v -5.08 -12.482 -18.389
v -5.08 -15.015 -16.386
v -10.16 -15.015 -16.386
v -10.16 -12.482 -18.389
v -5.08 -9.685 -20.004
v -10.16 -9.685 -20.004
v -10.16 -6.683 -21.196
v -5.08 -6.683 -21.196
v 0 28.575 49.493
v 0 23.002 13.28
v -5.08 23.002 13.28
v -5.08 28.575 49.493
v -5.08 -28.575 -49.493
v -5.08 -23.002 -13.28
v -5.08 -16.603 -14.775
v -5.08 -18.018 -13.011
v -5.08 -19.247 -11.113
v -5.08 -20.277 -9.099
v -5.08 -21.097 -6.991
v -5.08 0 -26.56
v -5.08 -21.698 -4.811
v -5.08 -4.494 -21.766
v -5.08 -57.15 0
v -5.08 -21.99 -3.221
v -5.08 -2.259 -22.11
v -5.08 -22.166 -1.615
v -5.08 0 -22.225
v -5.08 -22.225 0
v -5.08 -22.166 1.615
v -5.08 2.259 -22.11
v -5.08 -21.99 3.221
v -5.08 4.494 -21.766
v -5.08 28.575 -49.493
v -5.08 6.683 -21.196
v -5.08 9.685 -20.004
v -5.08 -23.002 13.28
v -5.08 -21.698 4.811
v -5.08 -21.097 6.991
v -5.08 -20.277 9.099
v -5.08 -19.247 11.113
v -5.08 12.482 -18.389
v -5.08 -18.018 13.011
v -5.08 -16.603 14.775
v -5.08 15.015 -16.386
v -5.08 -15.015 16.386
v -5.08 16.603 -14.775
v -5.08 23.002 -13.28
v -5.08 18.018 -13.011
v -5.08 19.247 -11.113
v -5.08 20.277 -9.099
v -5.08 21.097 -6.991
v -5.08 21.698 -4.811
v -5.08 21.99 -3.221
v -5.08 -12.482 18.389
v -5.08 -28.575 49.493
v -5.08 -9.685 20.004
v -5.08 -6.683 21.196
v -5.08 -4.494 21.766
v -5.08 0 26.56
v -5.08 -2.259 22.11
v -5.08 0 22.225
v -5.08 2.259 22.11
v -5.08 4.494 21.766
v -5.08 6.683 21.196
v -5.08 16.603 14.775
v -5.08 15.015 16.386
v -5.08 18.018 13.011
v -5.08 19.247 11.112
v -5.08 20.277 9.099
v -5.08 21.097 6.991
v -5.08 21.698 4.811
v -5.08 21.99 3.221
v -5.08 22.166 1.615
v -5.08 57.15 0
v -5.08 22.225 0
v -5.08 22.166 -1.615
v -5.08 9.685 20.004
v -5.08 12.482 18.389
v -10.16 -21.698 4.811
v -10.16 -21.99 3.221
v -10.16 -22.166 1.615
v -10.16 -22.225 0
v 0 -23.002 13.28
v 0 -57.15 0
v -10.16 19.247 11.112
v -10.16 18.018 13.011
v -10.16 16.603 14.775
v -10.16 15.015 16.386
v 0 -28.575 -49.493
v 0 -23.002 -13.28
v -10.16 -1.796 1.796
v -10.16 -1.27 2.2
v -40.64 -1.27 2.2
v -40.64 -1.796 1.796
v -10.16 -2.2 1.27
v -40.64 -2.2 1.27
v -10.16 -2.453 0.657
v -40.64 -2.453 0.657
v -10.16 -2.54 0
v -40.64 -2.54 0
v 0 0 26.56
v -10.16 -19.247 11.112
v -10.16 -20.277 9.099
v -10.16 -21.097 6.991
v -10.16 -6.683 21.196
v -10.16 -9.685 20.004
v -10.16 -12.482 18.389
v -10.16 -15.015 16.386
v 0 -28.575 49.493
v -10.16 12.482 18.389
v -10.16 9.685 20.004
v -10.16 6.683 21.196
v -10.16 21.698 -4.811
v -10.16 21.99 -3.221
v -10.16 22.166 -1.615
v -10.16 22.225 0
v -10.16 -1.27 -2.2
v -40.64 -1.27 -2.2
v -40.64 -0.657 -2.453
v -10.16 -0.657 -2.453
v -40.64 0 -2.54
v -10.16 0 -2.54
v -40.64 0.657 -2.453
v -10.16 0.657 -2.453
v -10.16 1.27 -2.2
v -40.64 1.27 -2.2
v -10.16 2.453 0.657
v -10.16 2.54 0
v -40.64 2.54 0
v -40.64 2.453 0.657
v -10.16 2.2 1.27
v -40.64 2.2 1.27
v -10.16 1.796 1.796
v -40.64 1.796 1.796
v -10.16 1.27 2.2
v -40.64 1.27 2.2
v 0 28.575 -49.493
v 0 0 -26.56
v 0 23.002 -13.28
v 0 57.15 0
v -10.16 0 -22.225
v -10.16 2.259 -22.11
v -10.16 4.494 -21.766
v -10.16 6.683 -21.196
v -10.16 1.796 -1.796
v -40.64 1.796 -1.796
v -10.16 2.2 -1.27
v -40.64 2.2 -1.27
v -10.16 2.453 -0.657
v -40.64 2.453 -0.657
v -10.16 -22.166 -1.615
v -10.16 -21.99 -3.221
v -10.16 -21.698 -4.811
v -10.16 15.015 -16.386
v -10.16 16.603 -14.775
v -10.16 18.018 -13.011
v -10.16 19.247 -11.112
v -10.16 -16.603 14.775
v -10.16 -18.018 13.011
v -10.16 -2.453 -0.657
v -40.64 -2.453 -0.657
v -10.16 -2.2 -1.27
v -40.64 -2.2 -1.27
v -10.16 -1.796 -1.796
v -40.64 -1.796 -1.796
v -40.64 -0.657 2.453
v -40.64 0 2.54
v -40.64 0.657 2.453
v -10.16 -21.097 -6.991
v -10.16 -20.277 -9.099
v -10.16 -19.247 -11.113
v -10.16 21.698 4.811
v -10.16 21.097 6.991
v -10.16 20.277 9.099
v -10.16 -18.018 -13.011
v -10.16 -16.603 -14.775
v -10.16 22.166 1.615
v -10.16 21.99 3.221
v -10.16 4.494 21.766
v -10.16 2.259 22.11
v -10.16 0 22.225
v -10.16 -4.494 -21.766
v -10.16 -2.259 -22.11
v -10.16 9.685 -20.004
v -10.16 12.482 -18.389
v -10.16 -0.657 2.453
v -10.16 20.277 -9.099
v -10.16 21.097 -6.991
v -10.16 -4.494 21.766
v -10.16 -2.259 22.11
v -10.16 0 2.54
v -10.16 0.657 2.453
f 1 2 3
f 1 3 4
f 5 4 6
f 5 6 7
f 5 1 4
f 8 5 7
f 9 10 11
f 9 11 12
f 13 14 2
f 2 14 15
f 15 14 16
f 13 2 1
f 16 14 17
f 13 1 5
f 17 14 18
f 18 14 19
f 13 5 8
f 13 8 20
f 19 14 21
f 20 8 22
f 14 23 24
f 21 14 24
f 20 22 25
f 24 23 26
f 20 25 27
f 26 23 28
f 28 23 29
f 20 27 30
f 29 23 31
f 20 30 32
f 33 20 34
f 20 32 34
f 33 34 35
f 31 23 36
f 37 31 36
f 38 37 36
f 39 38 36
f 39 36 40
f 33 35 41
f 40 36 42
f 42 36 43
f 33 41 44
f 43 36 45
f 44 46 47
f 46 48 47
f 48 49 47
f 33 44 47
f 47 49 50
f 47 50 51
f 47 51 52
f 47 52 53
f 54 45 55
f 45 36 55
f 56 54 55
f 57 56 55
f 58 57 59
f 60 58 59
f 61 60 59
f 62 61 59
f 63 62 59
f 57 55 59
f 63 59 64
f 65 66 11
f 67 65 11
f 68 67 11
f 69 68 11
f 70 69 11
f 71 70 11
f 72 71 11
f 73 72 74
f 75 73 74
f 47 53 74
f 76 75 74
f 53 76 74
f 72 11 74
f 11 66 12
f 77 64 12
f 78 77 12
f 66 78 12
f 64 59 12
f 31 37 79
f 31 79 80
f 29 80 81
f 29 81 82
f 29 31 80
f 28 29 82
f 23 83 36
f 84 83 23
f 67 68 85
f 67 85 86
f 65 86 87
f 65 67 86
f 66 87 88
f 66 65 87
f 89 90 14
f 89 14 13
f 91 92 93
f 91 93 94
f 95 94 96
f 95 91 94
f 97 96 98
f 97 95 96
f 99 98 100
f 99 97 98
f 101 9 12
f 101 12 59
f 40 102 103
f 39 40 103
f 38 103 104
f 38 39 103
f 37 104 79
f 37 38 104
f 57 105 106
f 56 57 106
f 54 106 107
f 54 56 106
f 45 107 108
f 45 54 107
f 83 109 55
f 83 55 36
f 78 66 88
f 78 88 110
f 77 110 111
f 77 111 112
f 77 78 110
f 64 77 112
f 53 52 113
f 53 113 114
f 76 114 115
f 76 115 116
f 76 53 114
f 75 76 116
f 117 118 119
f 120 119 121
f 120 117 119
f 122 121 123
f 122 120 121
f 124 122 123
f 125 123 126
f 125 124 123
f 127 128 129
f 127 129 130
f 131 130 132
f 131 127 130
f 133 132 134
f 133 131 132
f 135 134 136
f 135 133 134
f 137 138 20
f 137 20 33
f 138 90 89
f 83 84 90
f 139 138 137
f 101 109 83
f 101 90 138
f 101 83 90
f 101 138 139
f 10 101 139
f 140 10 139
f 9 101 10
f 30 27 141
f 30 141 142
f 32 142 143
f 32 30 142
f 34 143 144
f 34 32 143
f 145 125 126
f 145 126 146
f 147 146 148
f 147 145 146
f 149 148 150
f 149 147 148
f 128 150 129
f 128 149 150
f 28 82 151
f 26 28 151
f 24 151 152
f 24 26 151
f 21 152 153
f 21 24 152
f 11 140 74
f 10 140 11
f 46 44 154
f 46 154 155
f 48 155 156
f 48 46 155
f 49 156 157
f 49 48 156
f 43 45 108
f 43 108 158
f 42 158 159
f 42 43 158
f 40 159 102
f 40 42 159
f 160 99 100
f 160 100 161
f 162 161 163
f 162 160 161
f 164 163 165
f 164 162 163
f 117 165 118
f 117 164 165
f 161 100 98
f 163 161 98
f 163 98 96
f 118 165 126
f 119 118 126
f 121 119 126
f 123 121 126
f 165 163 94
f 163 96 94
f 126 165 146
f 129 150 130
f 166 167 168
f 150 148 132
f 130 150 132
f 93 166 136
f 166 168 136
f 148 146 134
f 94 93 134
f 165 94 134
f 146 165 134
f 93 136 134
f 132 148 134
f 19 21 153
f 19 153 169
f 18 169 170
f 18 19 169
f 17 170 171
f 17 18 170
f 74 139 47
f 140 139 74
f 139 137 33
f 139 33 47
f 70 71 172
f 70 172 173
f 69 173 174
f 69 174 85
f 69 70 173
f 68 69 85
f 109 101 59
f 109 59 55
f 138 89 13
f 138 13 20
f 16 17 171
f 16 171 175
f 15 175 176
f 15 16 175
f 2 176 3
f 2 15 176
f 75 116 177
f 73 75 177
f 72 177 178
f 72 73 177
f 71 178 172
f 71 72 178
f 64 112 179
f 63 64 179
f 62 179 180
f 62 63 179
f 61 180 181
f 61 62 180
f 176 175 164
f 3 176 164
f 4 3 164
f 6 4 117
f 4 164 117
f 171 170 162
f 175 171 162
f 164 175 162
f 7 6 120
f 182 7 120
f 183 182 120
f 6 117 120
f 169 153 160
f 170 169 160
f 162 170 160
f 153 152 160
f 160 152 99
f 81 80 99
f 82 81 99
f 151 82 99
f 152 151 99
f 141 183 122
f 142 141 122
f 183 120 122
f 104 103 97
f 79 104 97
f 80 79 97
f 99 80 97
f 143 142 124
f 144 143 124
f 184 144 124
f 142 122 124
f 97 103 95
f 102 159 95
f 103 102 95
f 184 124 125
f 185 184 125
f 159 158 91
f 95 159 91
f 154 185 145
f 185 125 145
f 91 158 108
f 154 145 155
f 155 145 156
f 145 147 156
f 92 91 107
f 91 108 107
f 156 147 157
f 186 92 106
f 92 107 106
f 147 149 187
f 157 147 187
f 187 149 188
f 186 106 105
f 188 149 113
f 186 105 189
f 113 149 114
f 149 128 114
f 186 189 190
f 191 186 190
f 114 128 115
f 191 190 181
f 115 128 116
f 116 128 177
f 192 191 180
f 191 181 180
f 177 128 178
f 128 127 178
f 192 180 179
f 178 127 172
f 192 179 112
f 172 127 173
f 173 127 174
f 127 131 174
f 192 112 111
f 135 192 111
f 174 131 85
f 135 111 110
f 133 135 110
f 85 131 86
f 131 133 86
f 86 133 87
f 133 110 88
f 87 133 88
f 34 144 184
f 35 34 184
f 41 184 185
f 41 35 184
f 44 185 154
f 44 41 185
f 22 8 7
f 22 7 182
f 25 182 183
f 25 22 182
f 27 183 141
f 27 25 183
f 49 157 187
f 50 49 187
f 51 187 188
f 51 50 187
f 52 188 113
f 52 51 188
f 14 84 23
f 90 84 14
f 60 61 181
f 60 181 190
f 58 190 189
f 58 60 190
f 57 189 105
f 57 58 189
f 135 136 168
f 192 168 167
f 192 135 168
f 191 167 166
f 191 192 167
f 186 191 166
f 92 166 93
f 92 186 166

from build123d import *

# Parameters (mm, degrees)
F1_DEPTH = 40.64
F2_DEPTH = 10.16
F3_DEPTH = 5.08


with BuildPart() as f1:
    # F0 (on Right) → F1 (new body)
    with BuildSketch(Plane.YZ):
        with BuildLine():
            Line((-1.27, -2.1997045256), (0, 0))
            Line((0, 0), (-2.54, 0))
            ThreePointArc((-2.54, 0), (-2.1997045256, -1.27), (-1.27, -2.1997045256))
        make_face()
        with BuildLine():
            Line((1.27, -2.1997045256), (0, 0))
            Line((0, 0), (-1.27, -2.1997045256))
            ThreePointArc((-1.27, -2.1997045256), (0, -2.54), (1.27, -2.1997045256))
        make_face()
        with BuildLine():
            ThreePointArc((1.27, -2.1997045256), (2.1997045256, -1.27), (2.54, 0))
            Line((2.54, 0), (0, 0))
            Line((0, 0), (1.27, -2.1997045256))
        make_face()
        with BuildLine():
            Line((0, 0), (2.54, 0))
            ThreePointArc((2.54, 0), (2.1997045256, 1.27), (1.27, 2.1997045256))
            Line((1.27, 2.1997045256), (0, 0))
        make_face()
        with BuildLine():
            Line((-1.27, 2.1997045256), (0, 0))
            Line((0, 0), (1.27, 2.1997045256))
            ThreePointArc((1.27, 2.1997045256), (0, 2.54), (-1.27, 2.1997045256))
        make_face()
        with BuildLine():
            Line((-2.54, 0), (0, 0))
            Line((0, 0), (-1.27, 2.1997045256))
            ThreePointArc((-1.27, 2.1997045256), (-2.1997045256, 1.27), (-2.54, 0))
        make_face()
    extrude(amount=-F1_DEPTH)

    # F0 (on Right) → F2 (join)
    with BuildSketch(Plane.YZ):
        with BuildLine():
            ThreePointArc((21.6980938733, -4.8107532948), (22.0928807689, -2.419761214), (22.225, 0))
            Line((22.225, 0), (20.9576915714, 0))
            Line((20.9576915714, 0), (21.6980938733, -4.8107532948))
        make_face()
        with BuildLine():
            Line((20.9576915714, 0), (22.225, 0))
            ThreePointArc((22.225, 0), (22.0928807689, 2.4197612139), (21.6980938733, 4.8107532948))
            Line((21.6980938733, 4.8107532948), (20.9576915714, 0))
        make_face()
        with BuildLine():
            Line((19.2474145991, -11.1125), (20.9576915714, 0))
            Line((20.9576915714, 0), (2.54, 0))
            ThreePointArc((2.54, 0), (2.1997045256, -1.27), (1.27, -2.1997045256))
            Line((1.27, -2.1997045256), (10.4788457857, -18.1498933056))
            Line((10.4788457857, -18.1498933056), (19.2474145991, -11.1125))
        make_face()
        with BuildLine():
            Line((2.54, 0), (20.9576915714, 0))
            Line((20.9576915714, 0), (19.2474145991, 11.1125))
            Line((19.2474145991, 11.1125), (10.4788457857, 18.1498933056))
            Line((10.4788457857, 18.1498933056), (1.27, 2.1997045256))
            ThreePointArc((1.27, 2.1997045256), (2.1997045256, 1.27), (2.54, 0))
        make_face()
        with BuildLine():
            Line((19.2474145991, 11.1125), (20.9576915714, 0))
            Line((20.9576915714, 0), (21.6980938733, 4.8107532948))
            ThreePointArc((21.6980938733, 4.8107532948), (20.713803825, 8.0553681542), (19.2474145991, 11.1125))
        make_face()
        with BuildLine():
            Line((21.6980938733, -4.8107532948), (20.9576915714, 0))
            Line((20.9576915714, 0), (19.2474145991, -11.1125))
            ThreePointArc((19.2474145991, -11.1125), (20.713803825, -8.0553681542), (21.6980938733, -4.8107532948))
        make_face()
        with BuildLine():
            Line((10.4788457857, 18.1498933056), (11.1125, 19.2474145991))
            ThreePointArc((11.1125, 19.2474145991), (8.9508657021, 20.3428765956), (6.682812372, 21.1964771554))
            Line((6.682812372, 21.1964771554), (10.4788457857, 18.1498933056))
        make_face()
        with BuildLine():
            ThreePointArc((15.0152815013, 16.3857238606), (13.1420150668, 17.9231153816), (11.1125, 19.2474145991))
            Line((11.1125, 19.2474145991), (10.4788457857, 18.1498933056))
            Line((10.4788457857, 18.1498933056), (15.0152815013, 16.3857238606))
        make_face()
        with BuildLine():
            Line((10.4788457857, -18.1498933056), (11.1125, -19.2474145991))
            ThreePointArc((11.1125, -19.2474145991), (13.1420150668, -17.9231153816), (15.0152815013, -16.3857238606))
            Line((15.0152815013, -16.3857238606), (10.4788457857, -18.1498933056))
        make_face()
        with BuildLine():
            ThreePointArc((6.682812372, -21.1964771554), (8.9508657021, -20.3428765956), (11.1125, -19.2474145991))
            Line((11.1125, -19.2474145991), (10.4788457857, -18.1498933056))
            Line((10.4788457857, -18.1498933056), (6.682812372, -21.1964771554))
        make_face()
        with BuildLine():
            ThreePointArc((19.2474145991, 11.1125), (17.3330553708, 13.9109962444), (15.0152815013, 16.3857238606))
            Line((15.0152815013, 16.3857238606), (10.4788457857, 18.1498933056))
            Line((10.4788457857, 18.1498933056), (19.2474145991, 11.1125))
        make_face()
        with BuildLine():
            Line((10.4788457857, -18.1498933056), (15.0152815013, -16.3857238606))
            ThreePointArc((15.0152815013, -16.3857238606), (17.3330553708, -13.9109962444), (19.2474145991, -11.1125))
            Line((19.2474145991, -11.1125), (10.4788457857, -18.1498933056))
        make_face()
        with BuildLine():
            Line((-10.4788457857, 18.1498933056), (-11.1125, 19.2474145991))
            ThreePointArc((-11.1125, 19.2474145991), (-13.1420150668, 17.9231153816), (-15.0152815013, 16.3857238606))
            Line((-15.0152815013, 16.3857238606), (-10.4788457857, 18.1498933056))
        make_face()
        with BuildLine():
            ThreePointArc((-6.682812372, 21.1964771554), (-8.9508657021, 20.3428765956), (-11.1125, 19.2474145991))
            Line((-11.1125, 19.2474145991), (-10.4788457857, 18.1498933056))
            Line((-10.4788457857, 18.1498933056), (-6.682812372, 21.1964771554))
        make_face()
        with BuildLine():
            Line((10.4788457857, 18.1498933056), (6.682812372, 21.1964771554))
            ThreePointArc((6.682812372, 21.1964771554), (3.3807484542, 21.9663643985), (0, 22.225))
            Line((0, 22.225), (10.4788457857, 18.1498933056))
        make_face()
        with BuildLine():
            ThreePointArc((0, 22.225), (-3.3807484542, 21.9663643985), (-6.682812372, 21.1964771554))
            Line((-6.682812372, 21.1964771554), (-10.4788457857, 18.1498933056))
            Line((-10.4788457857, 18.1498933056), (0, 22.225))
        make_face()
        with BuildLine():
            Line((1.27, 2.1997045256), (10.4788457857, 18.1498933056))
            Line((10.4788457857, 18.1498933056), (0, 22.225))
            Line((0, 22.225), (-10.4788457857, 18.1498933056))
            Line((-10.4788457857, 18.1498933056), (-1.27, 2.1997045256))
            ThreePointArc((-1.27, 2.1997045256), (0, 2.54), (1.27, 2.1997045256))
        make_face()
        with BuildLine():
            Line((-10.4788457857, -18.1498933056), (-11.1125, -19.2474145991))
            ThreePointArc((-11.1125, -19.2474145991), (-8.9508657021, -20.3428765956), (-6.682812372, -21.1964771554))
            Line((-6.682812372, -21.1964771554), (-10.4788457857, -18.1498933056))
        make_face()
        with BuildLine():
            ThreePointArc((-15.0152815013, -16.3857238606), (-13.1420150668, -17.9231153816), (-11.1125, -19.2474145991))
            Line((-11.1125, -19.2474145991), (-10.4788457857, -18.1498933056))
            Line((-10.4788457857, -18.1498933056), (-15.0152815013, -16.3857238606))
        make_face()
        with BuildLine():
            Line((-10.4788457857, -18.1498933056), (-6.682812372, -21.1964771554))
            ThreePointArc((-6.682812372, -21.1964771554), (-3.3807484542, -21.9663643985), (0, -22.225))
            Line((0, -22.225), (-10.4788457857, -18.1498933056))
        make_face()
        with BuildLine():
            ThreePointArc((0, -22.225), (3.3807484542, -21.9663643985), (6.682812372, -21.1964771554))
            Line((6.682812372, -21.1964771554), (10.4788457857, -18.1498933056))
            Line((10.4788457857, -18.1498933056), (0, -22.225))
        make_face()
        with BuildLine():
            Line((0, -22.225), (10.4788457857, -18.1498933056))
            Line((10.4788457857, -18.1498933056), (1.27, -2.1997045256))
            ThreePointArc((1.27, -2.1997045256), (0, -2.54), (-1.27, -2.1997045256))
            Line((-1.27, -2.1997045256), (-10.4788457857, -18.1498933056))
            Line((-10.4788457857, -18.1498933056), (0, -22.225))
        make_face()
        with BuildLine():
            ThreePointArc((-21.6980938733, 4.8107532948), (-22.0928807689, 2.419761214), (-22.225, 0))
            Line((-22.225, 0), (-20.9576915714, 0))
            Line((-20.9576915714, 0), (-21.6980938733, 4.8107532948))
        make_face()
        with BuildLine():
            Line((-20.9576915714, 0), (-22.225, 0))
            ThreePointArc((-22.225, 0), (-22.0928807689, -2.419761214), (-21.6980938733, -4.8107532948))
            Line((-21.6980938733, -4.8107532948), (-20.9576915714, 0))
        make_face()
        with BuildLine():
            Line((-10.4788457857, 18.1498933056), (-15.0152815013, 16.3857238606))
            ThreePointArc((-15.0152815013, 16.3857238606), (-17.3330553708, 13.9109962444), (-19.2474145991, 11.1125))
            Line((-19.2474145991, 11.1125), (-10.4788457857, 18.1498933056))
        make_face()
        with BuildLine():
            ThreePointArc((-19.2474145991, 11.1125), (-20.713803825, 8.0553681542), (-21.6980938733, 4.8107532948))
            Line((-21.6980938733, 4.8107532948), (-20.9576915714, 0))
            Line((-20.9576915714, 0), (-19.2474145991, 11.1125))
        make_face()
        with BuildLine():
            Line((-1.27, 2.1997045256), (-10.4788457857, 18.1498933056))
            Line((-10.4788457857, 18.1498933056), (-19.2474145991, 11.1125))
            Line((-19.2474145991, 11.1125), (-20.9576915714, 0))
            Line((-20.9576915714, 0), (-2.54, 0))
            ThreePointArc((-2.54, 0), (-2.1997045256, 1.27), (-1.27, 2.1997045256))
        make_face()
        with BuildLine():
            ThreePointArc((-19.2474145991, -11.1125), (-17.3330553708, -13.9109962444), (-15.0152815013, -16.3857238606))
            Line((-15.0152815013, -16.3857238606), (-10.4788457857, -18.1498933056))
            Line((-10.4788457857, -18.1498933056), (-19.2474145991, -11.1125))
        make_face()
        with BuildLine():
            Line((-20.9576915714, 0), (-21.6980938733, -4.8107532948))
            ThreePointArc((-21.6980938733, -4.8107532948), (-20.713803825, -8.0553681542), (-19.2474145991, -11.1125))
            Line((-19.2474145991, -11.1125), (-20.9576915714, 0))
        make_face()
        with BuildLine():
            Line((-19.2474145991, -11.1125), (-10.4788457857, -18.1498933056))
            Line((-10.4788457857, -18.1498933056), (-1.27, -2.1997045256))
            ThreePointArc((-1.27, -2.1997045256), (-2.1997045256, -1.27), (-2.54, 0))
            Line((-2.54, 0), (-20.9576915714, 0))
            Line((-20.9576915714, 0), (-19.2474145991, -11.1125))
        make_face()
    extrude(amount=-F2_DEPTH)

    # F0 (on Right) → F3 (join)
    with BuildSketch(Plane.YZ):
        with BuildLine():
            Line((23.0015517527, -13.2799520962), (57.15, 0))
            Line((57.15, 0), (22.225, 0))
            ThreePointArc((22.225, 0), (22.0928807689, -2.419761214), (21.6980938733, -4.8107532948))
            Line((21.6980938733, -4.8107532948), (23.0015517527, -13.2799520962))
        make_face()
        with BuildLine():
            Line((22.225, 0), (57.15, 0))
            Line((57.15, 0), (23.0015517527, 13.2799520962))
            Line((23.0015517527, 13.2799520962), (21.6980938733, 4.8107532948))
            ThreePointArc((21.6980938733, 4.8107532948), (22.0928807689, 2.4197612139), (22.225, 0))
        make_face()
        with BuildLine():
            Line((11.1125, 19.2474145991), (28.575, 49.4933518263))
            Line((28.575, 49.4933518263), (0, 26.5599041924))
            Line((0, 26.5599041924), (6.682812372, 21.1964771554))
            ThreePointArc((6.682812372, 21.1964771554), (8.9508657021, 20.3428765956), (11.1125, 19.2474145991))
        make_face()
        with BuildLine():
            Line((23.0015517527, 13.2799520962), (28.575, 49.4933518263))
            Line((28.575, 49.4933518263), (11.1125, 19.2474145991))
            ThreePointArc((11.1125, 19.2474145991), (13.1420150668, 17.9231153816), (15.0152815013, 16.3857238606))
            Line((15.0152815013, 16.3857238606), (23.0015517527, 13.2799520962))
        make_face()
        with BuildLine():
            Line((11.1125, -19.2474145991), (28.575, -49.4933518263))
            Line((28.575, -49.4933518263), (23.0015517527, -13.2799520962))
            Line((23.0015517527, -13.2799520962), (15.0152815013, -16.3857238606))
            ThreePointArc((15.0152815013, -16.3857238606), (13.1420150668, -17.9231153816), (11.1125, -19.2474145991))
        make_face()
        with BuildLine():
            Line((0, -26.5599041924), (28.575, -49.4933518263))
            Line((28.575, -49.4933518263), (11.1125, -19.2474145991))
            ThreePointArc((11.1125, -19.2474145991), (8.9508657021, -20.3428765956), (6.682812372, -21.1964771554))
            Line((6.682812372, -21.1964771554), (0, -26.5599041924))
        make_face()
        with BuildLine():
            Line((21.6980938733, 4.8107532948), (23.0015517527, 13.2799520962))
            Line((23.0015517527, 13.2799520962), (15.0152815013, 16.3857238606))
            ThreePointArc((15.0152815013, 16.3857238606), (17.3330553708, 13.9109962444), (19.2474145991, 11.1125))
            ThreePointArc((19.2474145991, 11.1125), (20.713803825, 8.0553681542), (21.6980938733, 4.8107532948))
        make_face()
        with BuildLine():
            Line((15.0152815013, -16.3857238606), (23.0015517527, -13.2799520962))
            Line((23.0015517527, -13.2799520962), (21.6980938733, -4.8107532948))
            ThreePointArc((21.6980938733, -4.8107532948), (20.713803825, -8.0553681542), (19.2474145991, -11.1125))
            ThreePointArc((19.2474145991, -11.1125), (17.3330553708, -13.9109962444), (15.0152815013, -16.3857238606))
        make_face()
        with BuildLine():
            Line((-11.1125, 19.2474145991), (-28.575, 49.4933518263))
            Line((-28.575, 49.4933518263), (-23.0015517527, 13.2799520962))
            Line((-23.0015517527, 13.2799520962), (-15.0152815013, 16.3857238606))
            ThreePointArc((-15.0152815013, 16.3857238606), (-13.1420150668, 17.9231153816), (-11.1125, 19.2474145991))
        make_face()
        with BuildLine():
            Line((0, 26.5599041924), (-28.575, 49.4933518263))
            Line((-28.575, 49.4933518263), (-11.1125, 19.2474145991))
            ThreePointArc((-11.1125, 19.2474145991), (-8.9508657021, 20.3428765956), (-6.682812372, 21.1964771554))
            Line((-6.682812372, 21.1964771554), (0, 26.5599041924))
        make_face()
        with BuildLine():
            Line((6.682812372, 21.1964771554), (0, 26.5599041924))
            Line((0, 26.5599041924), (-6.682812372, 21.1964771554))
            ThreePointArc((-6.682812372, 21.1964771554), (-3.3807484542, 21.9663643985), (0, 22.225))
            ThreePointArc((0, 22.225), (3.3807484542, 21.9663643985), (6.682812372, 21.1964771554))
        make_face()
        with BuildLine():
            Line((-11.1125, -19.2474145991), (-28.575, -49.4933518263))
            Line((-28.575, -49.4933518263), (0, -26.5599041924))
            Line((0, -26.5599041924), (-6.682812372, -21.1964771554))
            ThreePointArc((-6.682812372, -21.1964771554), (-8.9508657021, -20.3428765956), (-11.1125, -19.2474145991))
        make_face()
        with BuildLine():
            Line((-23.0015517527, -13.2799520962), (-28.575, -49.4933518263))
            Line((-28.575, -49.4933518263), (-11.1125, -19.2474145991))
            ThreePointArc((-11.1125, -19.2474145991), (-13.1420150668, -17.9231153816), (-15.0152815013, -16.3857238606))
            Line((-15.0152815013, -16.3857238606), (-23.0015517527, -13.2799520962))
        make_face()
        with BuildLine():
            Line((-6.682812372, -21.1964771554), (0, -26.5599041924))
            Line((0, -26.5599041924), (6.682812372, -21.1964771554))
            ThreePointArc((6.682812372, -21.1964771554), (3.3807484542, -21.9663643985), (0, -22.225))
            ThreePointArc((0, -22.225), (-3.3807484542, -21.9663643985), (-6.682812372, -21.1964771554))
        make_face()
        with BuildLine():
            Line((10.4788457857, -18.1498933056), (15.0152815013, -16.3857238606))
            ThreePointArc((15.0152815013, -16.3857238606), (17.3330553708, -13.9109962444), (19.2474145991, -11.1125))
            Line((19.2474145991, -11.1125), (10.4788457857, -18.1498933056))
        make_face()
        with BuildLine():
            Line((-23.0015517527, 13.2799520962), (-57.15, 0))
            Line((-57.15, 0), (-22.225, 0))
            ThreePointArc((-22.225, 0), (-22.0928807689, 2.419761214), (-21.6980938733, 4.8107532948))
            Line((-21.6980938733, 4.8107532948), (-23.0015517527, 13.2799520962))
        make_face()
        with BuildLine():
            Line((-22.225, 0), (-57.15, 0))
            Line((-57.15, 0), (-23.0015517527, -13.2799520962))
            Line((-23.0015517527, -13.2799520962), (-21.6980938733, -4.8107532948))
            ThreePointArc((-21.6980938733, -4.8107532948), (-22.0928807689, -2.419761214), (-22.225, 0))
        make_face()
        with BuildLine():
            Line((-15.0152815013, 16.3857238606), (-23.0015517527, 13.2799520962))
            Line((-23.0015517527, 13.2799520962), (-21.6980938733, 4.8107532948))
            ThreePointArc((-21.6980938733, 4.8107532948), (-20.713803825, 8.0553681542), (-19.2474145991, 11.1125))
            ThreePointArc((-19.2474145991, 11.1125), (-17.3330553708, 13.9109962444), (-15.0152815013, 16.3857238606))
        make_face()
        with BuildLine():
            Line((1.27, 2.1997045256), (10.4788457857, 18.1498933056))
            Line((10.4788457857, 18.1498933056), (0, 22.225))
            Line((0, 22.225), (-10.4788457857, 18.1498933056))
            Line((-10.4788457857, 18.1498933056), (-1.27, 2.1997045256))
            ThreePointArc((-1.27, 2.1997045256), (0, 2.54), (1.27, 2.1997045256))
        make_face()
        with BuildLine():
            Line((-21.6980938733, -4.8107532948), (-23.0015517527, -13.2799520962))
            Line((-23.0015517527, -13.2799520962), (-15.0152815013, -16.3857238606))
            ThreePointArc((-15.0152815013, -16.3857238606), (-17.3330553708, -13.9109962444), (-19.2474145991, -11.1125))
            ThreePointArc((-19.2474145991, -11.1125), (-20.713803825, -8.0553681542), (-21.6980938733, -4.8107532948))
        make_face()
        with BuildLine():
            Line((-10.4788457857, -18.1498933056), (-6.682812372, -21.1964771554))
            ThreePointArc((-6.682812372, -21.1964771554), (-3.3807484542, -21.9663643985), (0, -22.225))
            Line((0, -22.225), (-10.4788457857, -18.1498933056))
        make_face()
        with BuildLine():
            Line((0, -22.225), (10.4788457857, -18.1498933056))
            Line((10.4788457857, -18.1498933056), (1.27, -2.1997045256))
            ThreePointArc((1.27, -2.1997045256), (0, -2.54), (-1.27, -2.1997045256))
            Line((-1.27, -2.1997045256), (-10.4788457857, -18.1498933056))
            Line((-10.4788457857, -18.1498933056), (0, -22.225))
        make_face()
        with BuildLine():
            Line((-10.4788457857, 18.1498933056), (-15.0152815013, 16.3857238606))
            ThreePointArc((-15.0152815013, 16.3857238606), (-17.3330553708, 13.9109962444), (-19.2474145991, 11.1125))
            Line((-19.2474145991, 11.1125), (-10.4788457857, 18.1498933056))
        make_face()
        with BuildLine():
            Line((-20.9576915714, 0), (-21.6980938733, -4.8107532948))
            ThreePointArc((-21.6980938733, -4.8107532948), (-20.713803825, -8.0553681542), (-19.2474145991, -11.1125))
            Line((-19.2474145991, -11.1125), (-20.9576915714, 0))
        make_face()
        with BuildLine():
            Line((-19.2474145991, -11.1125), (-10.4788457857, -18.1498933056))
            Line((-10.4788457857, -18.1498933056), (-1.27, -2.1997045256))
            ThreePointArc((-1.27, -2.1997045256), (-2.1997045256, -1.27), (-2.54, 0))
            Line((-2.54, 0), (-20.9576915714, 0))
            Line((-20.9576915714, 0), (-19.2474145991, -11.1125))
        make_face()
    extrude(amount=-F3_DEPTH)


solid = f1.part
